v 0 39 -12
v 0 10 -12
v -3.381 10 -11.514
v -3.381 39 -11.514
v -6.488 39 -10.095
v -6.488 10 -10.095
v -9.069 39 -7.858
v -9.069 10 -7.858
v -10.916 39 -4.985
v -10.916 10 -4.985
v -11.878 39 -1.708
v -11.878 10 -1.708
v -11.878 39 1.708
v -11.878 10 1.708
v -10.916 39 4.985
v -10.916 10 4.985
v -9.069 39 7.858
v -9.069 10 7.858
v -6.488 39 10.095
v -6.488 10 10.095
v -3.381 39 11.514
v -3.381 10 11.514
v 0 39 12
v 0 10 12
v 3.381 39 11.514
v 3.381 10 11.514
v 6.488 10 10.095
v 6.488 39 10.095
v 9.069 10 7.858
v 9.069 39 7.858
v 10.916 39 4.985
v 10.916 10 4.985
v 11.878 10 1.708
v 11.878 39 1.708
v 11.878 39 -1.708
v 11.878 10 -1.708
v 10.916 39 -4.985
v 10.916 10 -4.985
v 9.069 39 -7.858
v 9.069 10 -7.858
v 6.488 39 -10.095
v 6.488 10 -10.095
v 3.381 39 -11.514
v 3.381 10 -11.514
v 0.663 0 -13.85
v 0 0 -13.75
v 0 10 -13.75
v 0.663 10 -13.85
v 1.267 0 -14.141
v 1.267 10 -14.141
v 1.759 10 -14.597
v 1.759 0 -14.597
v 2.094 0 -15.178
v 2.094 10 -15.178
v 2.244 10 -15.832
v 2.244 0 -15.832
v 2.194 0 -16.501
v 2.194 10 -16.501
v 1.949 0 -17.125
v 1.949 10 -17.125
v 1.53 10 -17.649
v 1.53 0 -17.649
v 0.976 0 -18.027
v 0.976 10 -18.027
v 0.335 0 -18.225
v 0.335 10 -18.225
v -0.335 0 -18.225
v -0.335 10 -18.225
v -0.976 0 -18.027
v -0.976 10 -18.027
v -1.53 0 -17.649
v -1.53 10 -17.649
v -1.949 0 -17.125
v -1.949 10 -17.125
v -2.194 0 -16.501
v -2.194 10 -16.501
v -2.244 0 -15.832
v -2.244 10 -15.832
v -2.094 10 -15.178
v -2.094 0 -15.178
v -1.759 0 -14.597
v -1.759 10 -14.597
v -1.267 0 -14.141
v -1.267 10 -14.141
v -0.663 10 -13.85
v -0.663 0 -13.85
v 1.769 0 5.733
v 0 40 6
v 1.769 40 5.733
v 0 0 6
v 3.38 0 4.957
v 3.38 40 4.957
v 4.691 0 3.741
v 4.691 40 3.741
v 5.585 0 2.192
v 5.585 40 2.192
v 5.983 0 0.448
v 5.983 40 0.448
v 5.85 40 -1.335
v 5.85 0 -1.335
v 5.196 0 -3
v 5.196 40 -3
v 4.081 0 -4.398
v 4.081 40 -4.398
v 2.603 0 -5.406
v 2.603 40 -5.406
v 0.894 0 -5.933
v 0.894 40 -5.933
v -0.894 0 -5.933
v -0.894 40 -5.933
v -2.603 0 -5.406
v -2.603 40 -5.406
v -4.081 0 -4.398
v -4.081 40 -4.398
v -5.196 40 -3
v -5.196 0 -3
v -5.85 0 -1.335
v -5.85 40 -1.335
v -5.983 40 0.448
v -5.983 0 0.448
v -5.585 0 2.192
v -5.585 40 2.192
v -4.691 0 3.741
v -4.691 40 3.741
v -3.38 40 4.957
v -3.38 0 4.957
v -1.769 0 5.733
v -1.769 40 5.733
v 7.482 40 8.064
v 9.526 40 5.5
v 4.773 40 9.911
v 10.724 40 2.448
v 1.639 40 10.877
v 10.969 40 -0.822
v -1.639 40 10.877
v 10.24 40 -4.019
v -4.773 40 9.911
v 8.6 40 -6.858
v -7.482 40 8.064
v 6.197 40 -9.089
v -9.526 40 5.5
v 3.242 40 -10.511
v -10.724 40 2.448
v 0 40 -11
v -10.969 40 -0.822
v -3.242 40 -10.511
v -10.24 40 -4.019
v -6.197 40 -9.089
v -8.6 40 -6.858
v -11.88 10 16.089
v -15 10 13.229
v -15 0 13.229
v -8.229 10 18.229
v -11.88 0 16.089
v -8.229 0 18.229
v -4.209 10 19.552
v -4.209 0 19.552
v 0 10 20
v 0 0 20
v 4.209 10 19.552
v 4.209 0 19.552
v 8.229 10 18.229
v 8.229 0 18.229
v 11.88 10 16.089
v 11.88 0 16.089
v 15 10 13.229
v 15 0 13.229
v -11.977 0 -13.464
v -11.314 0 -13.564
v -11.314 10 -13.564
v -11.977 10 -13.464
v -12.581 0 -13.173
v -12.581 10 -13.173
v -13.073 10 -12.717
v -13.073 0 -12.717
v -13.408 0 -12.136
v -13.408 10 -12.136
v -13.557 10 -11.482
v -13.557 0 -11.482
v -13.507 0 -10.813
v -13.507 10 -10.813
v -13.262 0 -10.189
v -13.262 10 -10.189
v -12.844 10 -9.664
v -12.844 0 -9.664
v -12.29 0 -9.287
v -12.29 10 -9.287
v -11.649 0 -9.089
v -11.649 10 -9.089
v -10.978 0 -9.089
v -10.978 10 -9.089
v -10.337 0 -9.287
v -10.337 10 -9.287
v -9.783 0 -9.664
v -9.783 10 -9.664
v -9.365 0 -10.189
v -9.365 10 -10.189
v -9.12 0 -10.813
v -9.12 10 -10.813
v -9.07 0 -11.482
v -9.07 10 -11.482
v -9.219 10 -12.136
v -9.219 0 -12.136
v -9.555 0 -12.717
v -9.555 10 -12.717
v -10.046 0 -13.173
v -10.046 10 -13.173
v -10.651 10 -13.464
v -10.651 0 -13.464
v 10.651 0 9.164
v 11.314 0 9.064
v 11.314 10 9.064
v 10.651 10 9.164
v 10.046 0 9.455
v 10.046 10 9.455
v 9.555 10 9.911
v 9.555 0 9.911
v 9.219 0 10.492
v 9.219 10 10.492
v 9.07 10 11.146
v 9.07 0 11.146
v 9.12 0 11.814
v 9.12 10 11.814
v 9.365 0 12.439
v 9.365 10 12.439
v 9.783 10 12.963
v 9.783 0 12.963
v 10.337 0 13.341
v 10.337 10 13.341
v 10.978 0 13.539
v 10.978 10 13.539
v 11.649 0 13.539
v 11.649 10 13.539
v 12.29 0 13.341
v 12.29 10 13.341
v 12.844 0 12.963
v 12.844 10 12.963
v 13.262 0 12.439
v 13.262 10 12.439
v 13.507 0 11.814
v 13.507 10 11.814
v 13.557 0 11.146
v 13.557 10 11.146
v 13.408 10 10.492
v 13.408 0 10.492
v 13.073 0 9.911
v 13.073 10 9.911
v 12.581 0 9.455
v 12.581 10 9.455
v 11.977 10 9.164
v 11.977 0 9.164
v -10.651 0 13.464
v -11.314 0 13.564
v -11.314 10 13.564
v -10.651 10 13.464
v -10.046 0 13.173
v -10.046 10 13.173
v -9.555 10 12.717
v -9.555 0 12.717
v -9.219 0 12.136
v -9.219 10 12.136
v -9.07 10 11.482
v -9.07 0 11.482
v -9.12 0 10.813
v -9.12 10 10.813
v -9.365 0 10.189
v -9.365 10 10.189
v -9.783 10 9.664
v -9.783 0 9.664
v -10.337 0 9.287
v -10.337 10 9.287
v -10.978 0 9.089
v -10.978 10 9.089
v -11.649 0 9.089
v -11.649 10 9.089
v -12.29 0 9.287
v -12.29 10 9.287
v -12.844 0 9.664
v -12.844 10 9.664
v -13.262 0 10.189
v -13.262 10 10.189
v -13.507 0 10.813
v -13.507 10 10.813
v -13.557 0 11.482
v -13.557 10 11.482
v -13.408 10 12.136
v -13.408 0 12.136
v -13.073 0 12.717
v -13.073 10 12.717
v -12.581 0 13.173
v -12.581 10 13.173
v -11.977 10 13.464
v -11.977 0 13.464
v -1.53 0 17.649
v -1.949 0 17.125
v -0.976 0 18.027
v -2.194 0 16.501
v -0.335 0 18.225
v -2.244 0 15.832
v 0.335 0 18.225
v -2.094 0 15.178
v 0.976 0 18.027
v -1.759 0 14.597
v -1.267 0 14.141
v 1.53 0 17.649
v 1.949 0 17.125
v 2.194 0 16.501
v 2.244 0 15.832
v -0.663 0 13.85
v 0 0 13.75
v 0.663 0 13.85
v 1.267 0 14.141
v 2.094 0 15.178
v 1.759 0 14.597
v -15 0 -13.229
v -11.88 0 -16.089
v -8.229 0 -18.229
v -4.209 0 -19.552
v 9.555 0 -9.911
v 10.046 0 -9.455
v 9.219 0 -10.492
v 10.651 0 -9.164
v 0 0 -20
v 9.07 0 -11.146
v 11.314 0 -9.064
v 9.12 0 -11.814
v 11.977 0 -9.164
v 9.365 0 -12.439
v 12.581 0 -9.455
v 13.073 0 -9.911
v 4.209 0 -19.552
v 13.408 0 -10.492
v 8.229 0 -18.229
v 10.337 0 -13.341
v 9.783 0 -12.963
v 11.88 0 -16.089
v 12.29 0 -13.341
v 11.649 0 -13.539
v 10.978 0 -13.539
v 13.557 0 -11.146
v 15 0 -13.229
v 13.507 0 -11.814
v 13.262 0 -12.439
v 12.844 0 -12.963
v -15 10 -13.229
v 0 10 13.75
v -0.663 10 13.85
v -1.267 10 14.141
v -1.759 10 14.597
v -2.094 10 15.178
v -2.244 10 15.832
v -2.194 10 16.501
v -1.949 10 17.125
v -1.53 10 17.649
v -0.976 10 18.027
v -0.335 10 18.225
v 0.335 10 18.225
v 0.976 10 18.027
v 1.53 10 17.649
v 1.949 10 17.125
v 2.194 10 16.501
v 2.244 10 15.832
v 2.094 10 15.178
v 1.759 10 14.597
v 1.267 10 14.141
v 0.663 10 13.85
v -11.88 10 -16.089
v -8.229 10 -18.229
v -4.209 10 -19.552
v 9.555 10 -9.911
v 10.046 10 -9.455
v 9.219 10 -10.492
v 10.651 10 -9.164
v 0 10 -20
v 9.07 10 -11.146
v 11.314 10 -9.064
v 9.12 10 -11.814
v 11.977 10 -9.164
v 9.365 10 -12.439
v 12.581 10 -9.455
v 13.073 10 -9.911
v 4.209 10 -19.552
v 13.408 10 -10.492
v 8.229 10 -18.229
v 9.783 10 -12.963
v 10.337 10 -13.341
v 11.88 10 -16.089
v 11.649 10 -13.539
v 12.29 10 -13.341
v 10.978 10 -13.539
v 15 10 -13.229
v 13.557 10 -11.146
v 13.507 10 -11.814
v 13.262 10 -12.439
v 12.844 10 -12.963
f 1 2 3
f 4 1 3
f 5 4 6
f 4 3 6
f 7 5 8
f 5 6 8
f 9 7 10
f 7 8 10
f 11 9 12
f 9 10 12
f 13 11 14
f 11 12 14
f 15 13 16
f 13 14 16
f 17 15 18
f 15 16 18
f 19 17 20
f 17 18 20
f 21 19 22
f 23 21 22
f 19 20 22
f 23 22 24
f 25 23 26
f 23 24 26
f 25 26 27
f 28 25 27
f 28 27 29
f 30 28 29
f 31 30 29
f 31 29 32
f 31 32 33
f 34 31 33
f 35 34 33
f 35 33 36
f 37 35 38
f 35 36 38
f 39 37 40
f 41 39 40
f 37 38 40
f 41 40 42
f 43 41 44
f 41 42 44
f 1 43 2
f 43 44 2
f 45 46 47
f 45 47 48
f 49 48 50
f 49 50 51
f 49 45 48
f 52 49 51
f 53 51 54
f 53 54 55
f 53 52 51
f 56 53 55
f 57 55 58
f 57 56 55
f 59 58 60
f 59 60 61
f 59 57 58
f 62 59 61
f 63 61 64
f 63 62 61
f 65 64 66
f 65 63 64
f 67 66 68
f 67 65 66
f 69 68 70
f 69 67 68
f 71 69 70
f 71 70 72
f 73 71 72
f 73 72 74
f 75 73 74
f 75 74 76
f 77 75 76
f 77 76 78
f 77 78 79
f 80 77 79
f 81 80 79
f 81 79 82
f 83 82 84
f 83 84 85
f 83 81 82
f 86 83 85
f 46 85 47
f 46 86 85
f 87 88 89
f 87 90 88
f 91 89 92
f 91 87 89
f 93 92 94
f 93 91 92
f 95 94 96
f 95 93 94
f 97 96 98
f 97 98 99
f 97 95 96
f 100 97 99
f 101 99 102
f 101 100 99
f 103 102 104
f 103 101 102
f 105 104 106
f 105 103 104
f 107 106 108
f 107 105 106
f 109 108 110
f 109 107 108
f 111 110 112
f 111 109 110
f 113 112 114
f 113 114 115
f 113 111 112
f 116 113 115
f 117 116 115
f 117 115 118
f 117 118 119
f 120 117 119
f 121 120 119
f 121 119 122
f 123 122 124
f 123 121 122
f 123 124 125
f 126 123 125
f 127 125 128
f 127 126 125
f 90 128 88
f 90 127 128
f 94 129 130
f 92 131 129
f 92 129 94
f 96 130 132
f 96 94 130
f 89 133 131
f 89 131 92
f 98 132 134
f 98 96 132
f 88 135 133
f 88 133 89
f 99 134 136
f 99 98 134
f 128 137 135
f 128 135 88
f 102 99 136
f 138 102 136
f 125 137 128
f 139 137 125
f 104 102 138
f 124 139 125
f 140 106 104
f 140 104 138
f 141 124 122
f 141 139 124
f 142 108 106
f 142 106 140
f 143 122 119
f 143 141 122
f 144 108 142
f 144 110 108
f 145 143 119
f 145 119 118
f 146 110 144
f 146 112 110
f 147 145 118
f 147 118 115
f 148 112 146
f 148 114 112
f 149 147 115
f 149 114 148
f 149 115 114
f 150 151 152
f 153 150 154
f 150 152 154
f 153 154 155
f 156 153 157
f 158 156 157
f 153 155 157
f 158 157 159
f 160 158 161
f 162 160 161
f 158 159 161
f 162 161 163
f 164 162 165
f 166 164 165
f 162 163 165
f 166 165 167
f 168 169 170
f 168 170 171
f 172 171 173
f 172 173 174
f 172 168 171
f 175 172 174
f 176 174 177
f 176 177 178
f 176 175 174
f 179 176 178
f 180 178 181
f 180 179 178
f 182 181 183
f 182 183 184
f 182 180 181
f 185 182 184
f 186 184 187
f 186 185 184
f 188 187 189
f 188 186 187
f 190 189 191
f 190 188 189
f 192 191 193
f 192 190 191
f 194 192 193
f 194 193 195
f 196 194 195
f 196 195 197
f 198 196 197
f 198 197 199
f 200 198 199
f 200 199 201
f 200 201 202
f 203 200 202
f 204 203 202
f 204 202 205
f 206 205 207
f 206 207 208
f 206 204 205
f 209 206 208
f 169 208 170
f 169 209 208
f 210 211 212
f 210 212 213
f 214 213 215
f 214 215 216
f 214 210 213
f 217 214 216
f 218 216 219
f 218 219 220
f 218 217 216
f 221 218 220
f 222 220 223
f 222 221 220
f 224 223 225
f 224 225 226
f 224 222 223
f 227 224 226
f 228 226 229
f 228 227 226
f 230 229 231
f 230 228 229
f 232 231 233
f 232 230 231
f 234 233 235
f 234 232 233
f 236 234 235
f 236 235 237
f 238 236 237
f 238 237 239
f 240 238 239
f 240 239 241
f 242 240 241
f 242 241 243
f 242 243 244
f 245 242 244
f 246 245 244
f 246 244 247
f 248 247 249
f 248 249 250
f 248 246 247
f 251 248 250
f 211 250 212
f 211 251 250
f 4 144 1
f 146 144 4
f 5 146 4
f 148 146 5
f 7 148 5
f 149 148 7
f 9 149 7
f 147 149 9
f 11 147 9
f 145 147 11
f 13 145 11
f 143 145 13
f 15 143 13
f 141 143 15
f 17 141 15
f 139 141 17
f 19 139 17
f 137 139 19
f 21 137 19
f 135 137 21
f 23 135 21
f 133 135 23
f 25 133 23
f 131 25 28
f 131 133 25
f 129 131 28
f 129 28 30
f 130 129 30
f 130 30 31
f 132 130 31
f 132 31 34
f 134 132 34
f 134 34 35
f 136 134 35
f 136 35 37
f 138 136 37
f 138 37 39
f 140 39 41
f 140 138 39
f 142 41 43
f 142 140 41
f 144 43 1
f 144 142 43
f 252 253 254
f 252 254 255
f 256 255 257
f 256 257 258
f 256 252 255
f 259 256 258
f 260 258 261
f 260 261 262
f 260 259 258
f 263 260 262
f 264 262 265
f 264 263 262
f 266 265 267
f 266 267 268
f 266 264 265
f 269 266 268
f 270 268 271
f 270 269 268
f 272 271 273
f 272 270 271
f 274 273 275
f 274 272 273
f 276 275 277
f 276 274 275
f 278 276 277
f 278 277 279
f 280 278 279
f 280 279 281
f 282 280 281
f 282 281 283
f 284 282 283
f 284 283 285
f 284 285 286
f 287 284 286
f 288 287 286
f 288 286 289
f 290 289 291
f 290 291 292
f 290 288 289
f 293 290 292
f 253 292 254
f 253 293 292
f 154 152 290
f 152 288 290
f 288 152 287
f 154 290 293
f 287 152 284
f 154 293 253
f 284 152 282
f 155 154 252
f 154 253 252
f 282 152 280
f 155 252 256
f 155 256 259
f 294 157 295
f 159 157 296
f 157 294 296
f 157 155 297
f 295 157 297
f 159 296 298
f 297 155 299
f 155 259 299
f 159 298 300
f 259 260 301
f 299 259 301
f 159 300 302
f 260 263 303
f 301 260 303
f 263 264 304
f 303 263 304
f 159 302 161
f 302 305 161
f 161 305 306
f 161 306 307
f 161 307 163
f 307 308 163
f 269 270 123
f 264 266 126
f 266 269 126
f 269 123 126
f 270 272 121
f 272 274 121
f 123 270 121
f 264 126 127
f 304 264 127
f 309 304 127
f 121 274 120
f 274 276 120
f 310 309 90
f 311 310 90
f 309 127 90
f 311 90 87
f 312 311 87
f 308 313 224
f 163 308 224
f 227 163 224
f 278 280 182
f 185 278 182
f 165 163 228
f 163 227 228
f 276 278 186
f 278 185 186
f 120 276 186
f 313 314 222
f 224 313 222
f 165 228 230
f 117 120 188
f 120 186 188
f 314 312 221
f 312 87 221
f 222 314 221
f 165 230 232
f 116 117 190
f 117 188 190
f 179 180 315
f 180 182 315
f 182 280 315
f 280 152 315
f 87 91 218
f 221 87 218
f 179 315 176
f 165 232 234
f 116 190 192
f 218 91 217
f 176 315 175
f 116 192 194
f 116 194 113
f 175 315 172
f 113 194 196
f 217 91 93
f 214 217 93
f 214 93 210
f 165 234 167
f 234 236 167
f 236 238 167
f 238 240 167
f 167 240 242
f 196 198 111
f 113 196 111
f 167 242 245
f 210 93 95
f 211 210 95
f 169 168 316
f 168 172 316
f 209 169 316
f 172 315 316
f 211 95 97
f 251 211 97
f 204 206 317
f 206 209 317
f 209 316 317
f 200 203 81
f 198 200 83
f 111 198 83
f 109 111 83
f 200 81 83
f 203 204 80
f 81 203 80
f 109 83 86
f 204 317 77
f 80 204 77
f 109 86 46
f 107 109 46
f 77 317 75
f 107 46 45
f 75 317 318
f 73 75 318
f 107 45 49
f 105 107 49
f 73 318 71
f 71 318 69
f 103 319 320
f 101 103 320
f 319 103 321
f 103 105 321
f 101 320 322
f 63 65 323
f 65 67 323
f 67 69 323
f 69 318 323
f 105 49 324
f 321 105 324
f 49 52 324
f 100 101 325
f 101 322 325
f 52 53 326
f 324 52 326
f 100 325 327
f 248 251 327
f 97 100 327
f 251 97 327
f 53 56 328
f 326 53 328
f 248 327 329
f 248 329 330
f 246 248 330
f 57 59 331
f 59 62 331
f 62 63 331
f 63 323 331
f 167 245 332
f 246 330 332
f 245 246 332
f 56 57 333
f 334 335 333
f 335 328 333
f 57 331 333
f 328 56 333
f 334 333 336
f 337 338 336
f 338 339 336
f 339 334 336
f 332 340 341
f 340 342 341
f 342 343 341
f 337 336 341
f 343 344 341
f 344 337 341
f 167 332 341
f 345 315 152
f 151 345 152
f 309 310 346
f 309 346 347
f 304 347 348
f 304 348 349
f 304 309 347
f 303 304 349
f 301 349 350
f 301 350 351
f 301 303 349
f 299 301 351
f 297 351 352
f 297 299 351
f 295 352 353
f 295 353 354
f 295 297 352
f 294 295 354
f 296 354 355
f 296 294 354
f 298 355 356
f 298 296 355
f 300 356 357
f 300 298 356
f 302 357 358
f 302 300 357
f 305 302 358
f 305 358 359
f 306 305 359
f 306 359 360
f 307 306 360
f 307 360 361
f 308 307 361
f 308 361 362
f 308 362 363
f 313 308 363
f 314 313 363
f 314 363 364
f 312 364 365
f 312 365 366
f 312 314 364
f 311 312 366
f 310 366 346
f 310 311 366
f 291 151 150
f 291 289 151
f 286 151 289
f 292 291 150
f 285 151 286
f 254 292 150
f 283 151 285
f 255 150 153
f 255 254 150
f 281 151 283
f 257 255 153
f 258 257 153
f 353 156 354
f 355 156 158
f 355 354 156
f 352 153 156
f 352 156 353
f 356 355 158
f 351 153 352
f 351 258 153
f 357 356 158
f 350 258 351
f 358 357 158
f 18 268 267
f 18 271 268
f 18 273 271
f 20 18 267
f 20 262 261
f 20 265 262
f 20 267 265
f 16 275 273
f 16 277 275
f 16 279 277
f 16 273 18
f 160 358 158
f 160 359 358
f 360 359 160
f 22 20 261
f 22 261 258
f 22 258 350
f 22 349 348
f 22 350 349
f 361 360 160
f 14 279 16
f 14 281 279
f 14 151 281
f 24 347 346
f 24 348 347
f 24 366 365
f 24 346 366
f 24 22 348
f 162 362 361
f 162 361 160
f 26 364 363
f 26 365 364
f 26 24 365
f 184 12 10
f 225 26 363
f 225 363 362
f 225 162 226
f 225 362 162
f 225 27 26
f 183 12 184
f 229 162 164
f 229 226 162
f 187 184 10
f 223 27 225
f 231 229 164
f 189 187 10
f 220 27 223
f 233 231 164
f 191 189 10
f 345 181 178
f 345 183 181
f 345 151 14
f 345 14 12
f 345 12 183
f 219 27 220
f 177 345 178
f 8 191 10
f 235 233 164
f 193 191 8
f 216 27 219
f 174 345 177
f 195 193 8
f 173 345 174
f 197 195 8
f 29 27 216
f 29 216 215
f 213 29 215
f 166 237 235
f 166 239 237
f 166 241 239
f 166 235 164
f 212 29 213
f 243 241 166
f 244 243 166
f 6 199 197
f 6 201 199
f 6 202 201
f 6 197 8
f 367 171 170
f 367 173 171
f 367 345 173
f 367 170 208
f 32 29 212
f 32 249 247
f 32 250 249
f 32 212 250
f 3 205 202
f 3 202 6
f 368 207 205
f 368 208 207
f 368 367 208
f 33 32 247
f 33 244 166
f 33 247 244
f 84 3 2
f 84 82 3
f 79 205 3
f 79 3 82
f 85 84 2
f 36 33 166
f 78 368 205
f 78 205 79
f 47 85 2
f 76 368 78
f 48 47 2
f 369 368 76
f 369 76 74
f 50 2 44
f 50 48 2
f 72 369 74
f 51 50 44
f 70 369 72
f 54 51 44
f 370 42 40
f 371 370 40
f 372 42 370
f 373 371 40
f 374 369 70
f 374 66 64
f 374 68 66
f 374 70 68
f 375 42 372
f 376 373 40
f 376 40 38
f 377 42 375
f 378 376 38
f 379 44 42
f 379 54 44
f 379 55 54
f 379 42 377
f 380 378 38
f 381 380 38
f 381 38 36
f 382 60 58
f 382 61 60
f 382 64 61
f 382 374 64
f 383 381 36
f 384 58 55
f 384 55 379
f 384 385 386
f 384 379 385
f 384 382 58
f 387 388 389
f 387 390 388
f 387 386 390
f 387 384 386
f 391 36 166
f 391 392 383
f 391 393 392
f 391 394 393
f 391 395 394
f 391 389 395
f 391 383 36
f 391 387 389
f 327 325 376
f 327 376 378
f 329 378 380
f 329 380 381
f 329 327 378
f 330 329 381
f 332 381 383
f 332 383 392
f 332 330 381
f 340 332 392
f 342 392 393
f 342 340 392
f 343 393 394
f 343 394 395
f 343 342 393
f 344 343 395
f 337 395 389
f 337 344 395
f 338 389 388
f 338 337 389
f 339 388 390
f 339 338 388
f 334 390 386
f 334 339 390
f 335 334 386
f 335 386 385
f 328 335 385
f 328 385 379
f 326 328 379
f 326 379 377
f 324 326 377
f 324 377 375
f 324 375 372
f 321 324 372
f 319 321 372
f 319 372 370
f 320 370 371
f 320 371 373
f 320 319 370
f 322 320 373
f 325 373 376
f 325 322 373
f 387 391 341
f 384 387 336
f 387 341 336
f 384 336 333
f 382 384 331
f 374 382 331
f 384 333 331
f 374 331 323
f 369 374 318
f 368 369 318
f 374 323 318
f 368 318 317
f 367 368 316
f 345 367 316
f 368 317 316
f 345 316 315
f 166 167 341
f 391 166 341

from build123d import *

# Parameters (mm, degrees)
SKETCH_1_R      = 6
SKETCH_1_R_2    = 2.25
EXTRUDE_1_DEPTH = 10
SKETCH_2_R      = 12
SKETCH_2_R_2    = 6
EXTRUDE_2_DEPTH = 30
CHAMFER_1_SIZE  = 1


with BuildPart() as part:
    # 草图1 → 凸台-拉伸1 (new body)
    with BuildSketch(Plane(origin=(0, 0, 0), x_dir=(1, 0, 0), z_dir=(0, 1, 0))):
        with BuildLine():
            Line((-15, 13.228756555), (-15, -13.228756555))
            ThreePointArc((-15, -13.228756555), (0, -20), (15, -13.228756555))
            Line((15, -13.228756555), (15, 13.228756555))
            ThreePointArc((15, 13.228756555), (0, 20), (-15, 13.228756555))
        make_face()
        with Locations(Location((0, 0, 0), (0, 0, 270))):
            Circle(SKETCH_1_R, mode=Mode.SUBTRACT)
        with Locations(Location((0, 16, 0), (0, 0, 270))):
            Circle(SKETCH_1_R_2, mode=Mode.SUBTRACT)
        with Locations(Location((11.313708499, 11.313708499, 0), (0, 0, 270))):
            Circle(SKETCH_1_R_2, mode=Mode.SUBTRACT)
        with Locations(Location((-11.313708499, 11.313708499, 0), (0, 0, 90))):
            Circle(SKETCH_1_R_2, mode=Mode.SUBTRACT)
        with Locations(Location((-11.313708499, -11.313708499, 0), (0, 0, 270))):
            Circle(SKETCH_1_R_2, mode=Mode.SUBTRACT)
        with Locations(Location((0, -16, 0), (0, 0, 90))):
            Circle(SKETCH_1_R_2, mode=Mode.SUBTRACT)
        with Locations(Location((11.313708499, -11.313708499, 0), (0, 0, 90))):
            Circle(SKETCH_1_R_2, mode=Mode.SUBTRACT)
    extrude(amount=EXTRUDE_1_DEPTH)

    # 草图2 → 凸台-拉伸2 (add)
    with BuildSketch(Plane(origin=(0, 10, 0), x_dir=(1, 0, 0), z_dir=(0, 1, 0))):
        with Locations(Location((0, 0, 0), (0, 0, 90))):
            Circle(SKETCH_2_R)
        with Locations(Location((0, 0, 0), (0, 0, 270))):
            Circle(SKETCH_2_R_2, mode=Mode.SUBTRACT)
    extrude(amount=EXTRUDE_2_DEPTH)

    # 倒角1
    chamfer_1_edges = [part.edges().sort_by_distance(p)[0] for p in [
        (0, 40, 12),
    ]]
    chamfer(chamfer_1_edges, length=CHAMFER_1_SIZE)


solid = part.part
